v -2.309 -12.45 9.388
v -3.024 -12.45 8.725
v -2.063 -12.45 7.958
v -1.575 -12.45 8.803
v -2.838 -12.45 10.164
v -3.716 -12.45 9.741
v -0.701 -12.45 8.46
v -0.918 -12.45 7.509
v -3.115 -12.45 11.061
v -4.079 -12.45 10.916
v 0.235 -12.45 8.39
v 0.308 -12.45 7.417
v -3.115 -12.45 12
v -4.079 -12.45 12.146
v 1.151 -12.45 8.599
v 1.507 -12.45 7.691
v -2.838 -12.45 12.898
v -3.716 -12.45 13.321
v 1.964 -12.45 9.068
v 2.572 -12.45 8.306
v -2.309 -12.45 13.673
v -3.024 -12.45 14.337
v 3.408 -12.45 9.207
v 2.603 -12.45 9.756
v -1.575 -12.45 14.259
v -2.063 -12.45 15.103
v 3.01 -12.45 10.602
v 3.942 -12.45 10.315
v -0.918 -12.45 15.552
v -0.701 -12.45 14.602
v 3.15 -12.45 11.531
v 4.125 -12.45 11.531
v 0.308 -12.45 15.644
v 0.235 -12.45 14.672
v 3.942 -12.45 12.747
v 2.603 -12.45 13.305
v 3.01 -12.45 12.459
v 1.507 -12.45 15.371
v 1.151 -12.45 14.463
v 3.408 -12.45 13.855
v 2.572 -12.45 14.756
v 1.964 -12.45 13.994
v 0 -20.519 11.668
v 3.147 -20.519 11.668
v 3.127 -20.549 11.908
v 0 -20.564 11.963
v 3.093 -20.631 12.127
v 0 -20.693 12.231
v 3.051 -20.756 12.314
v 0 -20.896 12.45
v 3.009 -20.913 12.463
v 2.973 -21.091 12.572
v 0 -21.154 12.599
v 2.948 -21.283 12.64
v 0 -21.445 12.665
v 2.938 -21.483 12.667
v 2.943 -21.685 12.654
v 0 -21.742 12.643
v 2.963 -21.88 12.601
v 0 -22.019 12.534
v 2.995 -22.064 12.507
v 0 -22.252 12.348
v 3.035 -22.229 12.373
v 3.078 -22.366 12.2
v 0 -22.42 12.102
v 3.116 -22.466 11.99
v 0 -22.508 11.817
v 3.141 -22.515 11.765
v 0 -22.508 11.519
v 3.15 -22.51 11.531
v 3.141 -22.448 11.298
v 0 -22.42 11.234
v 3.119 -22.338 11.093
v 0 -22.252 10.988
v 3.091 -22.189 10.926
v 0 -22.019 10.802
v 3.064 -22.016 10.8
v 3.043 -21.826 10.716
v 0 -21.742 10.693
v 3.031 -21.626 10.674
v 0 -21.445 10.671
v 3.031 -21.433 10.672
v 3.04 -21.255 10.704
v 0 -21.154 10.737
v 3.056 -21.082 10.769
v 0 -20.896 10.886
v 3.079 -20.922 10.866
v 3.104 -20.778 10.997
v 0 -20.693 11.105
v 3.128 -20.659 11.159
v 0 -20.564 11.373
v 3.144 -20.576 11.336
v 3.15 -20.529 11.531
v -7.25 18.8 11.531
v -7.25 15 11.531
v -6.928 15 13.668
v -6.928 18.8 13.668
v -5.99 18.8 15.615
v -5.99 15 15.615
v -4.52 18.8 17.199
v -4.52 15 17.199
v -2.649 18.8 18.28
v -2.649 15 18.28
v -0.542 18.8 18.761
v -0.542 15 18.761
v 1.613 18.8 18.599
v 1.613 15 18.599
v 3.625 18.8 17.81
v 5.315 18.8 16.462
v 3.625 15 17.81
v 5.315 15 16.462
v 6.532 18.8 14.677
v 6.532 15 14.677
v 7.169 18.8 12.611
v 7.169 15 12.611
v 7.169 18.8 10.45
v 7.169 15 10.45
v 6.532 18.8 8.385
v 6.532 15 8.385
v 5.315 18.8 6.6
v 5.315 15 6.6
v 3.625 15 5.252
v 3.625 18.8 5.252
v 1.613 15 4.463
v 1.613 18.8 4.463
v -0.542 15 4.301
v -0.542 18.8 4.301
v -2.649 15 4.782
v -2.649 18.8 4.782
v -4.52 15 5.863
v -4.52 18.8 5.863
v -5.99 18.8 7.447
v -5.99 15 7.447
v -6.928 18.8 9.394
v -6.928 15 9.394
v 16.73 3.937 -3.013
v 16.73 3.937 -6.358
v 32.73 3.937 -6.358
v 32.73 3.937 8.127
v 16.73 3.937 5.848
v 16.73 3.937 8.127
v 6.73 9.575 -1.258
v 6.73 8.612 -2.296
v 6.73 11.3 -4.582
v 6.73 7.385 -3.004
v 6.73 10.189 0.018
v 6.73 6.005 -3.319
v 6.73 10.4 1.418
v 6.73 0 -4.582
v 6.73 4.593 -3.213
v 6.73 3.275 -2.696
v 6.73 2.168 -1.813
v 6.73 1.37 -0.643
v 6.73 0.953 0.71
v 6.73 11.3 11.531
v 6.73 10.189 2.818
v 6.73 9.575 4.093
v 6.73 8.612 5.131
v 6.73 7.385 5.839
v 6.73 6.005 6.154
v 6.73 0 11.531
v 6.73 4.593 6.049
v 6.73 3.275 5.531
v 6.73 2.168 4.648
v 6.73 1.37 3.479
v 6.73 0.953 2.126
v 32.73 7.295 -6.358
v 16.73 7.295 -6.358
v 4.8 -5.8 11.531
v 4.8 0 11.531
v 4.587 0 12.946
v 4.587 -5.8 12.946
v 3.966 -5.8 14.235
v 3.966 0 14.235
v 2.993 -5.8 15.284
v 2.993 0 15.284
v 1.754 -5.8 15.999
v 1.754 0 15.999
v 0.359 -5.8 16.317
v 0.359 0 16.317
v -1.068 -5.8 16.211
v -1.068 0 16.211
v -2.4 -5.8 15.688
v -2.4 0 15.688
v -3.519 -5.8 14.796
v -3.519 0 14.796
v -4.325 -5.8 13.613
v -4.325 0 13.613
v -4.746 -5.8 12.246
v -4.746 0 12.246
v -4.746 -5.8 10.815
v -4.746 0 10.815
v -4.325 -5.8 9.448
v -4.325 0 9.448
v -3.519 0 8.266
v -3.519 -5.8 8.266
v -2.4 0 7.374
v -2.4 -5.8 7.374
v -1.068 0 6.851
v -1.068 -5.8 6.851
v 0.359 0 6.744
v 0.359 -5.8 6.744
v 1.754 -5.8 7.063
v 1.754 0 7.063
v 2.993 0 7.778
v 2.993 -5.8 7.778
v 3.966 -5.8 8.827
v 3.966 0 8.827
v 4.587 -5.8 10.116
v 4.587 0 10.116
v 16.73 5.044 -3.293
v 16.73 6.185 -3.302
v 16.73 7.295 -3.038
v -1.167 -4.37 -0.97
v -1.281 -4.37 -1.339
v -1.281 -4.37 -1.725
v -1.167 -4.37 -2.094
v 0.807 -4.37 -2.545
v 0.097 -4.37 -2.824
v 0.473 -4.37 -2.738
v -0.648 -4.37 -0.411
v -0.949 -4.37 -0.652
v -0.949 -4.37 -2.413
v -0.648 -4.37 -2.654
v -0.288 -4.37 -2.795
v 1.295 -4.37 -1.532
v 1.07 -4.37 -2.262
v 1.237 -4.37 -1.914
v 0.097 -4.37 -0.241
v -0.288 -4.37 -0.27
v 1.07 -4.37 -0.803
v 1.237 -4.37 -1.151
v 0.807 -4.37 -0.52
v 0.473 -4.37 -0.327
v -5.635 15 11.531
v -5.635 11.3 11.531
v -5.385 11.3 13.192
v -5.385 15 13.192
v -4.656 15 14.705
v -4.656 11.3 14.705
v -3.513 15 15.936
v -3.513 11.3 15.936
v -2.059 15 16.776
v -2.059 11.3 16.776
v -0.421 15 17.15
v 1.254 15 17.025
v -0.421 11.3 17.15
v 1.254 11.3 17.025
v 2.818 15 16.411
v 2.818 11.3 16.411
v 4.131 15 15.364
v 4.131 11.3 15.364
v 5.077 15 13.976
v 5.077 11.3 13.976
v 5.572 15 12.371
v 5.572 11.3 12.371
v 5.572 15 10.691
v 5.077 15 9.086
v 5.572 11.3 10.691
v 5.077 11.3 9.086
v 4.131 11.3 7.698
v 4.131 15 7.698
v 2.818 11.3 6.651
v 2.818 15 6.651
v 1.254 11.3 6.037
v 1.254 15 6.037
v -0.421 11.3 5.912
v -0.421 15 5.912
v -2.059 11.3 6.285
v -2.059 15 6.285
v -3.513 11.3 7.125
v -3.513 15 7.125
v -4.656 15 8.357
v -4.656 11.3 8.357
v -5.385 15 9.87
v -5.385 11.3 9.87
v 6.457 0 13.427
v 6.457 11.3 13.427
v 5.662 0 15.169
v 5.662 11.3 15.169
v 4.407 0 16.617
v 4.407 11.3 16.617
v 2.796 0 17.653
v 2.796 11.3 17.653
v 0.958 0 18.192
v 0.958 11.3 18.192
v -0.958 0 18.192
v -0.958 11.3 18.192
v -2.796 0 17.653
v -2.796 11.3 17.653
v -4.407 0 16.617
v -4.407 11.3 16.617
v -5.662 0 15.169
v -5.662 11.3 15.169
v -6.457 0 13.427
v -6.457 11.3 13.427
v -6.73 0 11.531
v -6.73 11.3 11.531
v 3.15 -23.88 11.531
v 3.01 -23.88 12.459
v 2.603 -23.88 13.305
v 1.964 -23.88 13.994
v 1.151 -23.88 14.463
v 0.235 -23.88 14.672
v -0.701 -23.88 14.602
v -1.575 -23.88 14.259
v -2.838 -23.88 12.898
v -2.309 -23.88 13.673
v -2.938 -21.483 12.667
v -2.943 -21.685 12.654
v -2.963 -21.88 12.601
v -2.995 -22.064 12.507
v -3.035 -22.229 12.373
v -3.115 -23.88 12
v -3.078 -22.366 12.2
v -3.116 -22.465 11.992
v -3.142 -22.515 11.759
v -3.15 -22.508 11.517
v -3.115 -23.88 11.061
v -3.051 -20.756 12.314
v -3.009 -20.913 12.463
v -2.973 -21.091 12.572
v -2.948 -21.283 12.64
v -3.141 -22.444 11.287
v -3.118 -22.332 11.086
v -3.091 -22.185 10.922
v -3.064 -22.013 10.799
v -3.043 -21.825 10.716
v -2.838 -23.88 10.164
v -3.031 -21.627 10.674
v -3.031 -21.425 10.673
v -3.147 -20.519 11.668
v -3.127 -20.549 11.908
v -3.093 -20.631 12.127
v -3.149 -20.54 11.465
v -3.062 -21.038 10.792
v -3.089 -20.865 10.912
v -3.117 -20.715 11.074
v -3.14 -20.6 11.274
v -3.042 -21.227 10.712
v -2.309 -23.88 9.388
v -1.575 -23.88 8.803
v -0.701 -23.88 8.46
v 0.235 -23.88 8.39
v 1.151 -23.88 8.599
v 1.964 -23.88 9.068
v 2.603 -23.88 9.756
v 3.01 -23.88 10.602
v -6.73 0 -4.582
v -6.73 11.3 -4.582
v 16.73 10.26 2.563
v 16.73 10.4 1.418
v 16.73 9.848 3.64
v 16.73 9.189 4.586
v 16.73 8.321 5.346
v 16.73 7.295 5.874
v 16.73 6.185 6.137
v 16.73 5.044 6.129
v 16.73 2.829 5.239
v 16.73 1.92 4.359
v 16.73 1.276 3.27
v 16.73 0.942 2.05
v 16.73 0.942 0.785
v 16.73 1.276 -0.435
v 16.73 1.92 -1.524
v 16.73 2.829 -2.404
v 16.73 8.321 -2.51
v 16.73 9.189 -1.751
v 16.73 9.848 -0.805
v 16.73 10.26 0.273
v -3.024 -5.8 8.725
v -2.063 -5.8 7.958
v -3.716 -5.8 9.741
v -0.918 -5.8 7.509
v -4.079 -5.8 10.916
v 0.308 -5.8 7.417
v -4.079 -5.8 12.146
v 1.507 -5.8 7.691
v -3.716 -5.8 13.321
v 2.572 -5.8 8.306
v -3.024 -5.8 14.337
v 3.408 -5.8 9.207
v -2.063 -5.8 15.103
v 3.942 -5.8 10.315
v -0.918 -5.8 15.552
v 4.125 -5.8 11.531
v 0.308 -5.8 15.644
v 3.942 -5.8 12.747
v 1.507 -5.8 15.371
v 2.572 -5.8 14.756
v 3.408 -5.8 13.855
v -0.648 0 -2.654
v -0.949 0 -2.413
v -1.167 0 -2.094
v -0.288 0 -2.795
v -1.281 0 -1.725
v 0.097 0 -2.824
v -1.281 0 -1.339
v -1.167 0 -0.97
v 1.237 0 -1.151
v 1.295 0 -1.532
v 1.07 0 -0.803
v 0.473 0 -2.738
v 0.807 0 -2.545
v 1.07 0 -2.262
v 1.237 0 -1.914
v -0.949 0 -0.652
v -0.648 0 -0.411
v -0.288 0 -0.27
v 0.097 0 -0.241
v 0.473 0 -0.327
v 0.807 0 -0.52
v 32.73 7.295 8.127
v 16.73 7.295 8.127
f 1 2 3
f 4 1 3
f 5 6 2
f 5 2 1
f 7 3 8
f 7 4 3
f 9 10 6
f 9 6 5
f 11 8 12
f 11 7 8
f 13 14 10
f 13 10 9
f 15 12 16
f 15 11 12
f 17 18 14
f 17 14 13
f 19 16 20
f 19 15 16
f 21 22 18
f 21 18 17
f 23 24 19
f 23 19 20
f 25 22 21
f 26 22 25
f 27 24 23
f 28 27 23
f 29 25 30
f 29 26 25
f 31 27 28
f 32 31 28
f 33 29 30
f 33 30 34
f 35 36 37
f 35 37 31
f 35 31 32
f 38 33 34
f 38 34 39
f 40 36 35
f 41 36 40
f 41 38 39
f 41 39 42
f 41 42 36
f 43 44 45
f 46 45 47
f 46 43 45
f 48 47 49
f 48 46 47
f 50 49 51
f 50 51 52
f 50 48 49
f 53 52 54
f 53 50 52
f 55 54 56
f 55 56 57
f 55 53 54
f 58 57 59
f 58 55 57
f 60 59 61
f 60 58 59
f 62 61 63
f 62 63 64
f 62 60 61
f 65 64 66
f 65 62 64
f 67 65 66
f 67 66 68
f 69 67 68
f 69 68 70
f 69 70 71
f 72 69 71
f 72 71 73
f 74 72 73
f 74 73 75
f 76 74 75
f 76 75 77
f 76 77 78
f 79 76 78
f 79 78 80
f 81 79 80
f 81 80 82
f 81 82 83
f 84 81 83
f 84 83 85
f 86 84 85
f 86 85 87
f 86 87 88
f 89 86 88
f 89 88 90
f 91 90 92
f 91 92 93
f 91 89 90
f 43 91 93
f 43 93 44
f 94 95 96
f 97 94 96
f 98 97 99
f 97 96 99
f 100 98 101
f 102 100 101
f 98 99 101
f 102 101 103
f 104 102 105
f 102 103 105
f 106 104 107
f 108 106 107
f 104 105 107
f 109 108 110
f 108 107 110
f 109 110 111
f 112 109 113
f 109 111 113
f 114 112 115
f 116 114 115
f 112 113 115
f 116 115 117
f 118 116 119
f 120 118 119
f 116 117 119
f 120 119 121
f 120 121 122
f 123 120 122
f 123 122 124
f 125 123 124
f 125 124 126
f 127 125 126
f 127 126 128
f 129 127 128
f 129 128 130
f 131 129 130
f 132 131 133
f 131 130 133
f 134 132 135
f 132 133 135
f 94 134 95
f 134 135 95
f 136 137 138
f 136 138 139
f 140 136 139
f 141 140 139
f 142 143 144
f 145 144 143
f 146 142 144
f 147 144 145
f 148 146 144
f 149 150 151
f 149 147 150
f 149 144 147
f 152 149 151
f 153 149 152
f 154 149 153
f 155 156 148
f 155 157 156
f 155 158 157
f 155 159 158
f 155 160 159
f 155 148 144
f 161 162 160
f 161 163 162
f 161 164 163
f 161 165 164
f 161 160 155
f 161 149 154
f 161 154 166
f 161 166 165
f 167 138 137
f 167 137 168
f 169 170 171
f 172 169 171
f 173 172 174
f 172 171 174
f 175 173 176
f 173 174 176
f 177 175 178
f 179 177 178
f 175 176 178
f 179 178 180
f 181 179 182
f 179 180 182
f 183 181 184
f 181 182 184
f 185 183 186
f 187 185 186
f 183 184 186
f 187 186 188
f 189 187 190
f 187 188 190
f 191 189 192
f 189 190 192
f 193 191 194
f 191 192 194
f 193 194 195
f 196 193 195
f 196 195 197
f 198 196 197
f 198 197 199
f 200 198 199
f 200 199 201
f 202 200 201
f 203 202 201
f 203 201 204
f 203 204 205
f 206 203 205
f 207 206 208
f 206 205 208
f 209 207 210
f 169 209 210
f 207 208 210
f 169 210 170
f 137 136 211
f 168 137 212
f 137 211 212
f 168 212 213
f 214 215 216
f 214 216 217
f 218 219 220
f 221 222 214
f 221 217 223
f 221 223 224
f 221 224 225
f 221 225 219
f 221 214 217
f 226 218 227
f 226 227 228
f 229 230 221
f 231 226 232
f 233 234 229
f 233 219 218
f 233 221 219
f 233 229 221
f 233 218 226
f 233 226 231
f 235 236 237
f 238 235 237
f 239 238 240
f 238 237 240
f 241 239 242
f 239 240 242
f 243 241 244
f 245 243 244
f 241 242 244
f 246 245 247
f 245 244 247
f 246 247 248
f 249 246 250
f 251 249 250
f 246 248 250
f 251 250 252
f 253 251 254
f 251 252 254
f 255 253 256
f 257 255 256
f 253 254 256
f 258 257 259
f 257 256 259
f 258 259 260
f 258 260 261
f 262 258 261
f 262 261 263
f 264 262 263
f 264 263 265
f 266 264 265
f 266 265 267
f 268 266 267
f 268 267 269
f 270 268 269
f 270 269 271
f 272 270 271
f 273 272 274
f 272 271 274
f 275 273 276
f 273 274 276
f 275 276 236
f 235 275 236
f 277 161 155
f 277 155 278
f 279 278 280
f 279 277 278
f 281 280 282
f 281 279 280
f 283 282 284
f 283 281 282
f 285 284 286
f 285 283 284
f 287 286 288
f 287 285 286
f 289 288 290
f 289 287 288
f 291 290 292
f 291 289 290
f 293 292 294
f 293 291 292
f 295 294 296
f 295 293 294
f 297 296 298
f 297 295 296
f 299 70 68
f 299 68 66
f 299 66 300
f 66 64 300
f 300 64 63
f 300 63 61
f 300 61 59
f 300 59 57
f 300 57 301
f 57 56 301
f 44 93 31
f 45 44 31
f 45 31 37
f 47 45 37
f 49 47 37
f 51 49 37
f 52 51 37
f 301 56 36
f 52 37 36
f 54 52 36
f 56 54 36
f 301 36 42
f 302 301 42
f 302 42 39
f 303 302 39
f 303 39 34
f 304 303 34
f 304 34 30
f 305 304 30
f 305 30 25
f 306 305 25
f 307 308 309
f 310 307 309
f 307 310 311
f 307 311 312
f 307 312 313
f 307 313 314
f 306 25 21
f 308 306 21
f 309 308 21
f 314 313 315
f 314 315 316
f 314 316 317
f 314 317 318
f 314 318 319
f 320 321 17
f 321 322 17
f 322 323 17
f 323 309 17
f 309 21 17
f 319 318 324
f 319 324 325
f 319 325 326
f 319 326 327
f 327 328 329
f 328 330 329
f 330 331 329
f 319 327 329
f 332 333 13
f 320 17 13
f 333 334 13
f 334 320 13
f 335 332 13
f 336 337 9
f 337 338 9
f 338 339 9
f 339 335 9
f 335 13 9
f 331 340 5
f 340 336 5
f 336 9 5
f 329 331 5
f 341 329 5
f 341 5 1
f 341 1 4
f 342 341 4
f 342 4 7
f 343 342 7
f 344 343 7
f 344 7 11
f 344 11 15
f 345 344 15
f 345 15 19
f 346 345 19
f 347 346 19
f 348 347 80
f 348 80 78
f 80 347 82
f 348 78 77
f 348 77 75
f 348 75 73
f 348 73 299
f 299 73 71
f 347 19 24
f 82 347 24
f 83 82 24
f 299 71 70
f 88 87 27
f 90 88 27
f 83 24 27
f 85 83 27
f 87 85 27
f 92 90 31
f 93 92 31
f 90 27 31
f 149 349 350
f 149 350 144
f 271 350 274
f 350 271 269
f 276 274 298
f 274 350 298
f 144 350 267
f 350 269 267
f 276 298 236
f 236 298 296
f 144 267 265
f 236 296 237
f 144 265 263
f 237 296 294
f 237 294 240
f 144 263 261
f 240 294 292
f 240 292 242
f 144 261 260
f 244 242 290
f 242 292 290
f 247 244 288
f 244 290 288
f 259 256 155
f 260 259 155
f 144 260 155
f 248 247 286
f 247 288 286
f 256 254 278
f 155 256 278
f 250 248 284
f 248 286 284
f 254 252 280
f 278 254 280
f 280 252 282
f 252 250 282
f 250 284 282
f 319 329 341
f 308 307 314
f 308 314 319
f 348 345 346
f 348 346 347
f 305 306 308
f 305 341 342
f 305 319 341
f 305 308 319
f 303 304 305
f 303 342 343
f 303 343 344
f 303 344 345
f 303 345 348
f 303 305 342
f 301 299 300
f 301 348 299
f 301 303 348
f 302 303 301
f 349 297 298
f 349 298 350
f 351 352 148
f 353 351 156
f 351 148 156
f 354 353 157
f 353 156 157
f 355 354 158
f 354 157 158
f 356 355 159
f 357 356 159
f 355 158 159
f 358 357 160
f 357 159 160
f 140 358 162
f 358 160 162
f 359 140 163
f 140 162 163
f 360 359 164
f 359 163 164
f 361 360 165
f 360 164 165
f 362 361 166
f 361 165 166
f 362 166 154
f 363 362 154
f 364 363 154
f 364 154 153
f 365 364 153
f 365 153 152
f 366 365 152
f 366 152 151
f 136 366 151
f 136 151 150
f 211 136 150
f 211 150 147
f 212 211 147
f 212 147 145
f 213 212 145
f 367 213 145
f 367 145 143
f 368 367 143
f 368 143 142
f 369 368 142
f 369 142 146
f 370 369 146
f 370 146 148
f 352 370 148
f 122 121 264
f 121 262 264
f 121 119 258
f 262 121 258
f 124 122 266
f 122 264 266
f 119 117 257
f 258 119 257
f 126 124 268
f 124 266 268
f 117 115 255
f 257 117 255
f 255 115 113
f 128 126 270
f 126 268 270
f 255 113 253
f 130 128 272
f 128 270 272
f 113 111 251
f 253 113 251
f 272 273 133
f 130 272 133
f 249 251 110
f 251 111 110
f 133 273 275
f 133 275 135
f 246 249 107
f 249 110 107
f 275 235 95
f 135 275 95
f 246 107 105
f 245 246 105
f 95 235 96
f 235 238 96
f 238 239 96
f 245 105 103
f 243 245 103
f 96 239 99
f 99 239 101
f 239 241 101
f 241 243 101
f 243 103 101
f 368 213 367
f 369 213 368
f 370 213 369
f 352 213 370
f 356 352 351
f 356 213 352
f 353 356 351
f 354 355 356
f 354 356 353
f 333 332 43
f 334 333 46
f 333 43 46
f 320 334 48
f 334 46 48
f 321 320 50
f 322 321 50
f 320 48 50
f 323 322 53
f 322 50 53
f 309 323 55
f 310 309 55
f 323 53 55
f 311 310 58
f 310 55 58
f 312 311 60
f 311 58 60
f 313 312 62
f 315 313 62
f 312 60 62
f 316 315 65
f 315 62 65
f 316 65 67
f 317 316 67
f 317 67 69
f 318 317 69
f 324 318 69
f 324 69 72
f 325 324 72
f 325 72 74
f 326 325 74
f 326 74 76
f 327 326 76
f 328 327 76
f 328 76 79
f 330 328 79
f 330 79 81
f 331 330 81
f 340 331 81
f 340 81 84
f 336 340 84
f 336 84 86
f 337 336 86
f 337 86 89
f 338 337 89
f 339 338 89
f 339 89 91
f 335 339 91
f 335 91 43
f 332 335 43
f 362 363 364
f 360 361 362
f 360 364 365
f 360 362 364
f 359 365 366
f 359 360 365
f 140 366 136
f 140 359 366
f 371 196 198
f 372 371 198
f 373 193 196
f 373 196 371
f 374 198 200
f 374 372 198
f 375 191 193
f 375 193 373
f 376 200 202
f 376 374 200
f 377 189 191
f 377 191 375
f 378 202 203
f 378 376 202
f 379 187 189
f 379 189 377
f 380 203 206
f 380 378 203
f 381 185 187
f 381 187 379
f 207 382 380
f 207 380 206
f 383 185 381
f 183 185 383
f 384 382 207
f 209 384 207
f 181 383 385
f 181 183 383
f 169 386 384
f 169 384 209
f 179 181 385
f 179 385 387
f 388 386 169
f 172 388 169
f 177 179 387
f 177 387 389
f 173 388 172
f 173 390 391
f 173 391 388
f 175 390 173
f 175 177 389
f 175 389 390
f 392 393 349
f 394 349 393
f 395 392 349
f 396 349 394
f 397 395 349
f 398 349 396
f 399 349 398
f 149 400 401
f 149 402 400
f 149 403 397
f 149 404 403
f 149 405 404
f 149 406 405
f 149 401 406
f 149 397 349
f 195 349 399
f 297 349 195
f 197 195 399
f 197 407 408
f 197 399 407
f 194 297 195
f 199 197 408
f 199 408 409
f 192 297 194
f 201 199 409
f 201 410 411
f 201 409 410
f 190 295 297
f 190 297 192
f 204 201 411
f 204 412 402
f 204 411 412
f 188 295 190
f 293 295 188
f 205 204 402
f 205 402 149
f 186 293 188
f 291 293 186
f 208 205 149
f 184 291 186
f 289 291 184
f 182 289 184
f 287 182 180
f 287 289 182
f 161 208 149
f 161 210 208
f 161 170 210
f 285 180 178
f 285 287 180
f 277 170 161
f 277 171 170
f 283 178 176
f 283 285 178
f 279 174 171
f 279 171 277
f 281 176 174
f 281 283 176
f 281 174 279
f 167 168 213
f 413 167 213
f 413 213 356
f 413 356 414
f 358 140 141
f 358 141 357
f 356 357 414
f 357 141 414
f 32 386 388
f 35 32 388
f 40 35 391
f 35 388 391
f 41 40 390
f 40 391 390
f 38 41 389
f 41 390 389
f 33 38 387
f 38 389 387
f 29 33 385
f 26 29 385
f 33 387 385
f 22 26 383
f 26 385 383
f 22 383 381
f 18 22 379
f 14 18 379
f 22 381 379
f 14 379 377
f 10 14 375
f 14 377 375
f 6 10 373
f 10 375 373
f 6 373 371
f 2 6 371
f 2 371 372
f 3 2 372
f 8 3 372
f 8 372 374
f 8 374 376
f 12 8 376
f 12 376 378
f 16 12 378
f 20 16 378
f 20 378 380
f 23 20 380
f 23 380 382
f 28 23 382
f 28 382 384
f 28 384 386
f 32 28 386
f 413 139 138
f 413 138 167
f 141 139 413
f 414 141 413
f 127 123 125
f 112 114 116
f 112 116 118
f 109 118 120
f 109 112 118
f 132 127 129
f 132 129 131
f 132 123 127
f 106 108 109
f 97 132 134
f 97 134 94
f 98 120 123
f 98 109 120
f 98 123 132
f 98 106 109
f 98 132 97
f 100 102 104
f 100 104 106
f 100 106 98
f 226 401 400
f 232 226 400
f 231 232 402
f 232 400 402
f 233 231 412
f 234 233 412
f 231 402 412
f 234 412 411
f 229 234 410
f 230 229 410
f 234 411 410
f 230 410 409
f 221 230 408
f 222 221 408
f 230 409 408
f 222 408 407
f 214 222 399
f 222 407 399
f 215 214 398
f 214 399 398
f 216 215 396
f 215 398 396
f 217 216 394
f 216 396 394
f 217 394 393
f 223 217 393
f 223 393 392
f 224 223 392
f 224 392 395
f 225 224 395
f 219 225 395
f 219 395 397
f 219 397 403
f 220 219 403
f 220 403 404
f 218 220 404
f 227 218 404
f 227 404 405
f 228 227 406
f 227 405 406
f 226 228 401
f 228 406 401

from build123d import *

# Parameters (mm, degrees)
F1_DEPTH      = 11.3
F2_R          = 4.8
F3_DEPTH      = 5.8
F4_R          = 4.125
F5_DEPTH      = 12.45
F6_R          = 3.15
F7_DEPTH      = 23.88
F8_R          = 1
F9_DEPTH      = 6.731
F9_DEPTH_BACK = 6.731
F10_R         = 5.635
F11_DEPTH     = 3.7
F12_R         = 7.25
F12_R_2       = 5.635
F13_DEPTH     = 3.8
F14_R         = 4.75
F15_DEPTH     = 10
F16_W         = 3.3575966954
F16_H         = 14.4844972529
F17_DEPTH     = 16
F18_R         = 1.295
F19_DEPTH     = 4.37


with BuildPart() as f1:
    # F0 (on Front) → F1 (new body)
    with BuildSketch(Plane.XZ):
        with BuildLine():
            ThreePointArc((6.73, 11.5308485135), (0, 18.2608485135), (-6.73, 11.5308485135))
            Line((-6.73, 11.5308485135), (-6.73, -4.5823248016))
            Line((-6.73, -4.5823248016), (6.73, -4.5823248016))
            Line((6.73, -4.5823248016), (6.73, 11.5308485135))
        make_face()
    extrude(amount=-F1_DEPTH)

    # F2 (on face) → F3 (join)
    with BuildSketch(Plane.XZ):
        with Locations((0, 11.5308485135)):
            Circle(F2_R)
    extrude(amount=F3_DEPTH)

    # F4 (on face) → F5 (join)
    with BuildSketch(Plane.XZ):
        with Locations((0, 11.5308485135)):
            Circle(F4_R)
    extrude(amount=F5_DEPTH)

    # F6 (on face) → F7 (join)
    with BuildSketch(Plane.XZ):
        with Locations((0, 11.5308485135)):
            Circle(F6_R)
    extrude(amount=F7_DEPTH)

    # F8 (on Right) → F9 (cut, two sides)
    with BuildSketch(Plane.YZ) as f9_sk:
        with Locations((-21.5193368495, 11.6681437939)):
            Circle(F8_R)
    extrude(amount=-F9_DEPTH, mode=Mode.SUBTRACT)
    extrude(f9_sk.sketch, amount=F9_DEPTH_BACK, mode=Mode.SUBTRACT)

    # F10 (on face) → F11 (join)
    with BuildSketch(Plane(origin=(0, 11.3, 0), x_dir=(-1, 0, 0), z_dir=(0, 1, 0))):
        with Locations((0, 11.5308485135)):
            Circle(F10_R)
    extrude(amount=F11_DEPTH)

    # F12 (on face) → F13 (join)
    with BuildSketch(Plane(origin=(0, 15, 0), x_dir=(-1, 0, 0), z_dir=(0, 1, 0))):
        with Locations((0, 11.5308485135)):
            Circle(F12_R)
        with Locations((0, 11.5308485135)):
            Circle(F12_R_2, mode=Mode.SUBTRACT)
        with Locations((0, 11.5308485135)):
            Circle(F12_R_2)
    extrude(amount=F13_DEPTH)

    # F14 (on face) → F15 (join)
    with BuildSketch(Plane.YZ.offset(6.73)):
        with Locations((5.65, 1.4176751984)):
            Circle(F14_R)
    extrude(amount=F15_DEPTH)

    # F16 (on face) → F17 (join)
    with BuildSketch(Plane.YZ.offset(16.73)):
        with Locations((5.616213195, 0.8844293188)):
            Rectangle(F16_W, F16_H)
    extrude(amount=F17_DEPTH)

    # F18 (on face) → F19 (join)
    with BuildSketch(Plane.XZ):
        with Locations((0, -1.5323248016)):
            Circle(F18_R)
    extrude(amount=F19_DEPTH)


solid = f1.part
